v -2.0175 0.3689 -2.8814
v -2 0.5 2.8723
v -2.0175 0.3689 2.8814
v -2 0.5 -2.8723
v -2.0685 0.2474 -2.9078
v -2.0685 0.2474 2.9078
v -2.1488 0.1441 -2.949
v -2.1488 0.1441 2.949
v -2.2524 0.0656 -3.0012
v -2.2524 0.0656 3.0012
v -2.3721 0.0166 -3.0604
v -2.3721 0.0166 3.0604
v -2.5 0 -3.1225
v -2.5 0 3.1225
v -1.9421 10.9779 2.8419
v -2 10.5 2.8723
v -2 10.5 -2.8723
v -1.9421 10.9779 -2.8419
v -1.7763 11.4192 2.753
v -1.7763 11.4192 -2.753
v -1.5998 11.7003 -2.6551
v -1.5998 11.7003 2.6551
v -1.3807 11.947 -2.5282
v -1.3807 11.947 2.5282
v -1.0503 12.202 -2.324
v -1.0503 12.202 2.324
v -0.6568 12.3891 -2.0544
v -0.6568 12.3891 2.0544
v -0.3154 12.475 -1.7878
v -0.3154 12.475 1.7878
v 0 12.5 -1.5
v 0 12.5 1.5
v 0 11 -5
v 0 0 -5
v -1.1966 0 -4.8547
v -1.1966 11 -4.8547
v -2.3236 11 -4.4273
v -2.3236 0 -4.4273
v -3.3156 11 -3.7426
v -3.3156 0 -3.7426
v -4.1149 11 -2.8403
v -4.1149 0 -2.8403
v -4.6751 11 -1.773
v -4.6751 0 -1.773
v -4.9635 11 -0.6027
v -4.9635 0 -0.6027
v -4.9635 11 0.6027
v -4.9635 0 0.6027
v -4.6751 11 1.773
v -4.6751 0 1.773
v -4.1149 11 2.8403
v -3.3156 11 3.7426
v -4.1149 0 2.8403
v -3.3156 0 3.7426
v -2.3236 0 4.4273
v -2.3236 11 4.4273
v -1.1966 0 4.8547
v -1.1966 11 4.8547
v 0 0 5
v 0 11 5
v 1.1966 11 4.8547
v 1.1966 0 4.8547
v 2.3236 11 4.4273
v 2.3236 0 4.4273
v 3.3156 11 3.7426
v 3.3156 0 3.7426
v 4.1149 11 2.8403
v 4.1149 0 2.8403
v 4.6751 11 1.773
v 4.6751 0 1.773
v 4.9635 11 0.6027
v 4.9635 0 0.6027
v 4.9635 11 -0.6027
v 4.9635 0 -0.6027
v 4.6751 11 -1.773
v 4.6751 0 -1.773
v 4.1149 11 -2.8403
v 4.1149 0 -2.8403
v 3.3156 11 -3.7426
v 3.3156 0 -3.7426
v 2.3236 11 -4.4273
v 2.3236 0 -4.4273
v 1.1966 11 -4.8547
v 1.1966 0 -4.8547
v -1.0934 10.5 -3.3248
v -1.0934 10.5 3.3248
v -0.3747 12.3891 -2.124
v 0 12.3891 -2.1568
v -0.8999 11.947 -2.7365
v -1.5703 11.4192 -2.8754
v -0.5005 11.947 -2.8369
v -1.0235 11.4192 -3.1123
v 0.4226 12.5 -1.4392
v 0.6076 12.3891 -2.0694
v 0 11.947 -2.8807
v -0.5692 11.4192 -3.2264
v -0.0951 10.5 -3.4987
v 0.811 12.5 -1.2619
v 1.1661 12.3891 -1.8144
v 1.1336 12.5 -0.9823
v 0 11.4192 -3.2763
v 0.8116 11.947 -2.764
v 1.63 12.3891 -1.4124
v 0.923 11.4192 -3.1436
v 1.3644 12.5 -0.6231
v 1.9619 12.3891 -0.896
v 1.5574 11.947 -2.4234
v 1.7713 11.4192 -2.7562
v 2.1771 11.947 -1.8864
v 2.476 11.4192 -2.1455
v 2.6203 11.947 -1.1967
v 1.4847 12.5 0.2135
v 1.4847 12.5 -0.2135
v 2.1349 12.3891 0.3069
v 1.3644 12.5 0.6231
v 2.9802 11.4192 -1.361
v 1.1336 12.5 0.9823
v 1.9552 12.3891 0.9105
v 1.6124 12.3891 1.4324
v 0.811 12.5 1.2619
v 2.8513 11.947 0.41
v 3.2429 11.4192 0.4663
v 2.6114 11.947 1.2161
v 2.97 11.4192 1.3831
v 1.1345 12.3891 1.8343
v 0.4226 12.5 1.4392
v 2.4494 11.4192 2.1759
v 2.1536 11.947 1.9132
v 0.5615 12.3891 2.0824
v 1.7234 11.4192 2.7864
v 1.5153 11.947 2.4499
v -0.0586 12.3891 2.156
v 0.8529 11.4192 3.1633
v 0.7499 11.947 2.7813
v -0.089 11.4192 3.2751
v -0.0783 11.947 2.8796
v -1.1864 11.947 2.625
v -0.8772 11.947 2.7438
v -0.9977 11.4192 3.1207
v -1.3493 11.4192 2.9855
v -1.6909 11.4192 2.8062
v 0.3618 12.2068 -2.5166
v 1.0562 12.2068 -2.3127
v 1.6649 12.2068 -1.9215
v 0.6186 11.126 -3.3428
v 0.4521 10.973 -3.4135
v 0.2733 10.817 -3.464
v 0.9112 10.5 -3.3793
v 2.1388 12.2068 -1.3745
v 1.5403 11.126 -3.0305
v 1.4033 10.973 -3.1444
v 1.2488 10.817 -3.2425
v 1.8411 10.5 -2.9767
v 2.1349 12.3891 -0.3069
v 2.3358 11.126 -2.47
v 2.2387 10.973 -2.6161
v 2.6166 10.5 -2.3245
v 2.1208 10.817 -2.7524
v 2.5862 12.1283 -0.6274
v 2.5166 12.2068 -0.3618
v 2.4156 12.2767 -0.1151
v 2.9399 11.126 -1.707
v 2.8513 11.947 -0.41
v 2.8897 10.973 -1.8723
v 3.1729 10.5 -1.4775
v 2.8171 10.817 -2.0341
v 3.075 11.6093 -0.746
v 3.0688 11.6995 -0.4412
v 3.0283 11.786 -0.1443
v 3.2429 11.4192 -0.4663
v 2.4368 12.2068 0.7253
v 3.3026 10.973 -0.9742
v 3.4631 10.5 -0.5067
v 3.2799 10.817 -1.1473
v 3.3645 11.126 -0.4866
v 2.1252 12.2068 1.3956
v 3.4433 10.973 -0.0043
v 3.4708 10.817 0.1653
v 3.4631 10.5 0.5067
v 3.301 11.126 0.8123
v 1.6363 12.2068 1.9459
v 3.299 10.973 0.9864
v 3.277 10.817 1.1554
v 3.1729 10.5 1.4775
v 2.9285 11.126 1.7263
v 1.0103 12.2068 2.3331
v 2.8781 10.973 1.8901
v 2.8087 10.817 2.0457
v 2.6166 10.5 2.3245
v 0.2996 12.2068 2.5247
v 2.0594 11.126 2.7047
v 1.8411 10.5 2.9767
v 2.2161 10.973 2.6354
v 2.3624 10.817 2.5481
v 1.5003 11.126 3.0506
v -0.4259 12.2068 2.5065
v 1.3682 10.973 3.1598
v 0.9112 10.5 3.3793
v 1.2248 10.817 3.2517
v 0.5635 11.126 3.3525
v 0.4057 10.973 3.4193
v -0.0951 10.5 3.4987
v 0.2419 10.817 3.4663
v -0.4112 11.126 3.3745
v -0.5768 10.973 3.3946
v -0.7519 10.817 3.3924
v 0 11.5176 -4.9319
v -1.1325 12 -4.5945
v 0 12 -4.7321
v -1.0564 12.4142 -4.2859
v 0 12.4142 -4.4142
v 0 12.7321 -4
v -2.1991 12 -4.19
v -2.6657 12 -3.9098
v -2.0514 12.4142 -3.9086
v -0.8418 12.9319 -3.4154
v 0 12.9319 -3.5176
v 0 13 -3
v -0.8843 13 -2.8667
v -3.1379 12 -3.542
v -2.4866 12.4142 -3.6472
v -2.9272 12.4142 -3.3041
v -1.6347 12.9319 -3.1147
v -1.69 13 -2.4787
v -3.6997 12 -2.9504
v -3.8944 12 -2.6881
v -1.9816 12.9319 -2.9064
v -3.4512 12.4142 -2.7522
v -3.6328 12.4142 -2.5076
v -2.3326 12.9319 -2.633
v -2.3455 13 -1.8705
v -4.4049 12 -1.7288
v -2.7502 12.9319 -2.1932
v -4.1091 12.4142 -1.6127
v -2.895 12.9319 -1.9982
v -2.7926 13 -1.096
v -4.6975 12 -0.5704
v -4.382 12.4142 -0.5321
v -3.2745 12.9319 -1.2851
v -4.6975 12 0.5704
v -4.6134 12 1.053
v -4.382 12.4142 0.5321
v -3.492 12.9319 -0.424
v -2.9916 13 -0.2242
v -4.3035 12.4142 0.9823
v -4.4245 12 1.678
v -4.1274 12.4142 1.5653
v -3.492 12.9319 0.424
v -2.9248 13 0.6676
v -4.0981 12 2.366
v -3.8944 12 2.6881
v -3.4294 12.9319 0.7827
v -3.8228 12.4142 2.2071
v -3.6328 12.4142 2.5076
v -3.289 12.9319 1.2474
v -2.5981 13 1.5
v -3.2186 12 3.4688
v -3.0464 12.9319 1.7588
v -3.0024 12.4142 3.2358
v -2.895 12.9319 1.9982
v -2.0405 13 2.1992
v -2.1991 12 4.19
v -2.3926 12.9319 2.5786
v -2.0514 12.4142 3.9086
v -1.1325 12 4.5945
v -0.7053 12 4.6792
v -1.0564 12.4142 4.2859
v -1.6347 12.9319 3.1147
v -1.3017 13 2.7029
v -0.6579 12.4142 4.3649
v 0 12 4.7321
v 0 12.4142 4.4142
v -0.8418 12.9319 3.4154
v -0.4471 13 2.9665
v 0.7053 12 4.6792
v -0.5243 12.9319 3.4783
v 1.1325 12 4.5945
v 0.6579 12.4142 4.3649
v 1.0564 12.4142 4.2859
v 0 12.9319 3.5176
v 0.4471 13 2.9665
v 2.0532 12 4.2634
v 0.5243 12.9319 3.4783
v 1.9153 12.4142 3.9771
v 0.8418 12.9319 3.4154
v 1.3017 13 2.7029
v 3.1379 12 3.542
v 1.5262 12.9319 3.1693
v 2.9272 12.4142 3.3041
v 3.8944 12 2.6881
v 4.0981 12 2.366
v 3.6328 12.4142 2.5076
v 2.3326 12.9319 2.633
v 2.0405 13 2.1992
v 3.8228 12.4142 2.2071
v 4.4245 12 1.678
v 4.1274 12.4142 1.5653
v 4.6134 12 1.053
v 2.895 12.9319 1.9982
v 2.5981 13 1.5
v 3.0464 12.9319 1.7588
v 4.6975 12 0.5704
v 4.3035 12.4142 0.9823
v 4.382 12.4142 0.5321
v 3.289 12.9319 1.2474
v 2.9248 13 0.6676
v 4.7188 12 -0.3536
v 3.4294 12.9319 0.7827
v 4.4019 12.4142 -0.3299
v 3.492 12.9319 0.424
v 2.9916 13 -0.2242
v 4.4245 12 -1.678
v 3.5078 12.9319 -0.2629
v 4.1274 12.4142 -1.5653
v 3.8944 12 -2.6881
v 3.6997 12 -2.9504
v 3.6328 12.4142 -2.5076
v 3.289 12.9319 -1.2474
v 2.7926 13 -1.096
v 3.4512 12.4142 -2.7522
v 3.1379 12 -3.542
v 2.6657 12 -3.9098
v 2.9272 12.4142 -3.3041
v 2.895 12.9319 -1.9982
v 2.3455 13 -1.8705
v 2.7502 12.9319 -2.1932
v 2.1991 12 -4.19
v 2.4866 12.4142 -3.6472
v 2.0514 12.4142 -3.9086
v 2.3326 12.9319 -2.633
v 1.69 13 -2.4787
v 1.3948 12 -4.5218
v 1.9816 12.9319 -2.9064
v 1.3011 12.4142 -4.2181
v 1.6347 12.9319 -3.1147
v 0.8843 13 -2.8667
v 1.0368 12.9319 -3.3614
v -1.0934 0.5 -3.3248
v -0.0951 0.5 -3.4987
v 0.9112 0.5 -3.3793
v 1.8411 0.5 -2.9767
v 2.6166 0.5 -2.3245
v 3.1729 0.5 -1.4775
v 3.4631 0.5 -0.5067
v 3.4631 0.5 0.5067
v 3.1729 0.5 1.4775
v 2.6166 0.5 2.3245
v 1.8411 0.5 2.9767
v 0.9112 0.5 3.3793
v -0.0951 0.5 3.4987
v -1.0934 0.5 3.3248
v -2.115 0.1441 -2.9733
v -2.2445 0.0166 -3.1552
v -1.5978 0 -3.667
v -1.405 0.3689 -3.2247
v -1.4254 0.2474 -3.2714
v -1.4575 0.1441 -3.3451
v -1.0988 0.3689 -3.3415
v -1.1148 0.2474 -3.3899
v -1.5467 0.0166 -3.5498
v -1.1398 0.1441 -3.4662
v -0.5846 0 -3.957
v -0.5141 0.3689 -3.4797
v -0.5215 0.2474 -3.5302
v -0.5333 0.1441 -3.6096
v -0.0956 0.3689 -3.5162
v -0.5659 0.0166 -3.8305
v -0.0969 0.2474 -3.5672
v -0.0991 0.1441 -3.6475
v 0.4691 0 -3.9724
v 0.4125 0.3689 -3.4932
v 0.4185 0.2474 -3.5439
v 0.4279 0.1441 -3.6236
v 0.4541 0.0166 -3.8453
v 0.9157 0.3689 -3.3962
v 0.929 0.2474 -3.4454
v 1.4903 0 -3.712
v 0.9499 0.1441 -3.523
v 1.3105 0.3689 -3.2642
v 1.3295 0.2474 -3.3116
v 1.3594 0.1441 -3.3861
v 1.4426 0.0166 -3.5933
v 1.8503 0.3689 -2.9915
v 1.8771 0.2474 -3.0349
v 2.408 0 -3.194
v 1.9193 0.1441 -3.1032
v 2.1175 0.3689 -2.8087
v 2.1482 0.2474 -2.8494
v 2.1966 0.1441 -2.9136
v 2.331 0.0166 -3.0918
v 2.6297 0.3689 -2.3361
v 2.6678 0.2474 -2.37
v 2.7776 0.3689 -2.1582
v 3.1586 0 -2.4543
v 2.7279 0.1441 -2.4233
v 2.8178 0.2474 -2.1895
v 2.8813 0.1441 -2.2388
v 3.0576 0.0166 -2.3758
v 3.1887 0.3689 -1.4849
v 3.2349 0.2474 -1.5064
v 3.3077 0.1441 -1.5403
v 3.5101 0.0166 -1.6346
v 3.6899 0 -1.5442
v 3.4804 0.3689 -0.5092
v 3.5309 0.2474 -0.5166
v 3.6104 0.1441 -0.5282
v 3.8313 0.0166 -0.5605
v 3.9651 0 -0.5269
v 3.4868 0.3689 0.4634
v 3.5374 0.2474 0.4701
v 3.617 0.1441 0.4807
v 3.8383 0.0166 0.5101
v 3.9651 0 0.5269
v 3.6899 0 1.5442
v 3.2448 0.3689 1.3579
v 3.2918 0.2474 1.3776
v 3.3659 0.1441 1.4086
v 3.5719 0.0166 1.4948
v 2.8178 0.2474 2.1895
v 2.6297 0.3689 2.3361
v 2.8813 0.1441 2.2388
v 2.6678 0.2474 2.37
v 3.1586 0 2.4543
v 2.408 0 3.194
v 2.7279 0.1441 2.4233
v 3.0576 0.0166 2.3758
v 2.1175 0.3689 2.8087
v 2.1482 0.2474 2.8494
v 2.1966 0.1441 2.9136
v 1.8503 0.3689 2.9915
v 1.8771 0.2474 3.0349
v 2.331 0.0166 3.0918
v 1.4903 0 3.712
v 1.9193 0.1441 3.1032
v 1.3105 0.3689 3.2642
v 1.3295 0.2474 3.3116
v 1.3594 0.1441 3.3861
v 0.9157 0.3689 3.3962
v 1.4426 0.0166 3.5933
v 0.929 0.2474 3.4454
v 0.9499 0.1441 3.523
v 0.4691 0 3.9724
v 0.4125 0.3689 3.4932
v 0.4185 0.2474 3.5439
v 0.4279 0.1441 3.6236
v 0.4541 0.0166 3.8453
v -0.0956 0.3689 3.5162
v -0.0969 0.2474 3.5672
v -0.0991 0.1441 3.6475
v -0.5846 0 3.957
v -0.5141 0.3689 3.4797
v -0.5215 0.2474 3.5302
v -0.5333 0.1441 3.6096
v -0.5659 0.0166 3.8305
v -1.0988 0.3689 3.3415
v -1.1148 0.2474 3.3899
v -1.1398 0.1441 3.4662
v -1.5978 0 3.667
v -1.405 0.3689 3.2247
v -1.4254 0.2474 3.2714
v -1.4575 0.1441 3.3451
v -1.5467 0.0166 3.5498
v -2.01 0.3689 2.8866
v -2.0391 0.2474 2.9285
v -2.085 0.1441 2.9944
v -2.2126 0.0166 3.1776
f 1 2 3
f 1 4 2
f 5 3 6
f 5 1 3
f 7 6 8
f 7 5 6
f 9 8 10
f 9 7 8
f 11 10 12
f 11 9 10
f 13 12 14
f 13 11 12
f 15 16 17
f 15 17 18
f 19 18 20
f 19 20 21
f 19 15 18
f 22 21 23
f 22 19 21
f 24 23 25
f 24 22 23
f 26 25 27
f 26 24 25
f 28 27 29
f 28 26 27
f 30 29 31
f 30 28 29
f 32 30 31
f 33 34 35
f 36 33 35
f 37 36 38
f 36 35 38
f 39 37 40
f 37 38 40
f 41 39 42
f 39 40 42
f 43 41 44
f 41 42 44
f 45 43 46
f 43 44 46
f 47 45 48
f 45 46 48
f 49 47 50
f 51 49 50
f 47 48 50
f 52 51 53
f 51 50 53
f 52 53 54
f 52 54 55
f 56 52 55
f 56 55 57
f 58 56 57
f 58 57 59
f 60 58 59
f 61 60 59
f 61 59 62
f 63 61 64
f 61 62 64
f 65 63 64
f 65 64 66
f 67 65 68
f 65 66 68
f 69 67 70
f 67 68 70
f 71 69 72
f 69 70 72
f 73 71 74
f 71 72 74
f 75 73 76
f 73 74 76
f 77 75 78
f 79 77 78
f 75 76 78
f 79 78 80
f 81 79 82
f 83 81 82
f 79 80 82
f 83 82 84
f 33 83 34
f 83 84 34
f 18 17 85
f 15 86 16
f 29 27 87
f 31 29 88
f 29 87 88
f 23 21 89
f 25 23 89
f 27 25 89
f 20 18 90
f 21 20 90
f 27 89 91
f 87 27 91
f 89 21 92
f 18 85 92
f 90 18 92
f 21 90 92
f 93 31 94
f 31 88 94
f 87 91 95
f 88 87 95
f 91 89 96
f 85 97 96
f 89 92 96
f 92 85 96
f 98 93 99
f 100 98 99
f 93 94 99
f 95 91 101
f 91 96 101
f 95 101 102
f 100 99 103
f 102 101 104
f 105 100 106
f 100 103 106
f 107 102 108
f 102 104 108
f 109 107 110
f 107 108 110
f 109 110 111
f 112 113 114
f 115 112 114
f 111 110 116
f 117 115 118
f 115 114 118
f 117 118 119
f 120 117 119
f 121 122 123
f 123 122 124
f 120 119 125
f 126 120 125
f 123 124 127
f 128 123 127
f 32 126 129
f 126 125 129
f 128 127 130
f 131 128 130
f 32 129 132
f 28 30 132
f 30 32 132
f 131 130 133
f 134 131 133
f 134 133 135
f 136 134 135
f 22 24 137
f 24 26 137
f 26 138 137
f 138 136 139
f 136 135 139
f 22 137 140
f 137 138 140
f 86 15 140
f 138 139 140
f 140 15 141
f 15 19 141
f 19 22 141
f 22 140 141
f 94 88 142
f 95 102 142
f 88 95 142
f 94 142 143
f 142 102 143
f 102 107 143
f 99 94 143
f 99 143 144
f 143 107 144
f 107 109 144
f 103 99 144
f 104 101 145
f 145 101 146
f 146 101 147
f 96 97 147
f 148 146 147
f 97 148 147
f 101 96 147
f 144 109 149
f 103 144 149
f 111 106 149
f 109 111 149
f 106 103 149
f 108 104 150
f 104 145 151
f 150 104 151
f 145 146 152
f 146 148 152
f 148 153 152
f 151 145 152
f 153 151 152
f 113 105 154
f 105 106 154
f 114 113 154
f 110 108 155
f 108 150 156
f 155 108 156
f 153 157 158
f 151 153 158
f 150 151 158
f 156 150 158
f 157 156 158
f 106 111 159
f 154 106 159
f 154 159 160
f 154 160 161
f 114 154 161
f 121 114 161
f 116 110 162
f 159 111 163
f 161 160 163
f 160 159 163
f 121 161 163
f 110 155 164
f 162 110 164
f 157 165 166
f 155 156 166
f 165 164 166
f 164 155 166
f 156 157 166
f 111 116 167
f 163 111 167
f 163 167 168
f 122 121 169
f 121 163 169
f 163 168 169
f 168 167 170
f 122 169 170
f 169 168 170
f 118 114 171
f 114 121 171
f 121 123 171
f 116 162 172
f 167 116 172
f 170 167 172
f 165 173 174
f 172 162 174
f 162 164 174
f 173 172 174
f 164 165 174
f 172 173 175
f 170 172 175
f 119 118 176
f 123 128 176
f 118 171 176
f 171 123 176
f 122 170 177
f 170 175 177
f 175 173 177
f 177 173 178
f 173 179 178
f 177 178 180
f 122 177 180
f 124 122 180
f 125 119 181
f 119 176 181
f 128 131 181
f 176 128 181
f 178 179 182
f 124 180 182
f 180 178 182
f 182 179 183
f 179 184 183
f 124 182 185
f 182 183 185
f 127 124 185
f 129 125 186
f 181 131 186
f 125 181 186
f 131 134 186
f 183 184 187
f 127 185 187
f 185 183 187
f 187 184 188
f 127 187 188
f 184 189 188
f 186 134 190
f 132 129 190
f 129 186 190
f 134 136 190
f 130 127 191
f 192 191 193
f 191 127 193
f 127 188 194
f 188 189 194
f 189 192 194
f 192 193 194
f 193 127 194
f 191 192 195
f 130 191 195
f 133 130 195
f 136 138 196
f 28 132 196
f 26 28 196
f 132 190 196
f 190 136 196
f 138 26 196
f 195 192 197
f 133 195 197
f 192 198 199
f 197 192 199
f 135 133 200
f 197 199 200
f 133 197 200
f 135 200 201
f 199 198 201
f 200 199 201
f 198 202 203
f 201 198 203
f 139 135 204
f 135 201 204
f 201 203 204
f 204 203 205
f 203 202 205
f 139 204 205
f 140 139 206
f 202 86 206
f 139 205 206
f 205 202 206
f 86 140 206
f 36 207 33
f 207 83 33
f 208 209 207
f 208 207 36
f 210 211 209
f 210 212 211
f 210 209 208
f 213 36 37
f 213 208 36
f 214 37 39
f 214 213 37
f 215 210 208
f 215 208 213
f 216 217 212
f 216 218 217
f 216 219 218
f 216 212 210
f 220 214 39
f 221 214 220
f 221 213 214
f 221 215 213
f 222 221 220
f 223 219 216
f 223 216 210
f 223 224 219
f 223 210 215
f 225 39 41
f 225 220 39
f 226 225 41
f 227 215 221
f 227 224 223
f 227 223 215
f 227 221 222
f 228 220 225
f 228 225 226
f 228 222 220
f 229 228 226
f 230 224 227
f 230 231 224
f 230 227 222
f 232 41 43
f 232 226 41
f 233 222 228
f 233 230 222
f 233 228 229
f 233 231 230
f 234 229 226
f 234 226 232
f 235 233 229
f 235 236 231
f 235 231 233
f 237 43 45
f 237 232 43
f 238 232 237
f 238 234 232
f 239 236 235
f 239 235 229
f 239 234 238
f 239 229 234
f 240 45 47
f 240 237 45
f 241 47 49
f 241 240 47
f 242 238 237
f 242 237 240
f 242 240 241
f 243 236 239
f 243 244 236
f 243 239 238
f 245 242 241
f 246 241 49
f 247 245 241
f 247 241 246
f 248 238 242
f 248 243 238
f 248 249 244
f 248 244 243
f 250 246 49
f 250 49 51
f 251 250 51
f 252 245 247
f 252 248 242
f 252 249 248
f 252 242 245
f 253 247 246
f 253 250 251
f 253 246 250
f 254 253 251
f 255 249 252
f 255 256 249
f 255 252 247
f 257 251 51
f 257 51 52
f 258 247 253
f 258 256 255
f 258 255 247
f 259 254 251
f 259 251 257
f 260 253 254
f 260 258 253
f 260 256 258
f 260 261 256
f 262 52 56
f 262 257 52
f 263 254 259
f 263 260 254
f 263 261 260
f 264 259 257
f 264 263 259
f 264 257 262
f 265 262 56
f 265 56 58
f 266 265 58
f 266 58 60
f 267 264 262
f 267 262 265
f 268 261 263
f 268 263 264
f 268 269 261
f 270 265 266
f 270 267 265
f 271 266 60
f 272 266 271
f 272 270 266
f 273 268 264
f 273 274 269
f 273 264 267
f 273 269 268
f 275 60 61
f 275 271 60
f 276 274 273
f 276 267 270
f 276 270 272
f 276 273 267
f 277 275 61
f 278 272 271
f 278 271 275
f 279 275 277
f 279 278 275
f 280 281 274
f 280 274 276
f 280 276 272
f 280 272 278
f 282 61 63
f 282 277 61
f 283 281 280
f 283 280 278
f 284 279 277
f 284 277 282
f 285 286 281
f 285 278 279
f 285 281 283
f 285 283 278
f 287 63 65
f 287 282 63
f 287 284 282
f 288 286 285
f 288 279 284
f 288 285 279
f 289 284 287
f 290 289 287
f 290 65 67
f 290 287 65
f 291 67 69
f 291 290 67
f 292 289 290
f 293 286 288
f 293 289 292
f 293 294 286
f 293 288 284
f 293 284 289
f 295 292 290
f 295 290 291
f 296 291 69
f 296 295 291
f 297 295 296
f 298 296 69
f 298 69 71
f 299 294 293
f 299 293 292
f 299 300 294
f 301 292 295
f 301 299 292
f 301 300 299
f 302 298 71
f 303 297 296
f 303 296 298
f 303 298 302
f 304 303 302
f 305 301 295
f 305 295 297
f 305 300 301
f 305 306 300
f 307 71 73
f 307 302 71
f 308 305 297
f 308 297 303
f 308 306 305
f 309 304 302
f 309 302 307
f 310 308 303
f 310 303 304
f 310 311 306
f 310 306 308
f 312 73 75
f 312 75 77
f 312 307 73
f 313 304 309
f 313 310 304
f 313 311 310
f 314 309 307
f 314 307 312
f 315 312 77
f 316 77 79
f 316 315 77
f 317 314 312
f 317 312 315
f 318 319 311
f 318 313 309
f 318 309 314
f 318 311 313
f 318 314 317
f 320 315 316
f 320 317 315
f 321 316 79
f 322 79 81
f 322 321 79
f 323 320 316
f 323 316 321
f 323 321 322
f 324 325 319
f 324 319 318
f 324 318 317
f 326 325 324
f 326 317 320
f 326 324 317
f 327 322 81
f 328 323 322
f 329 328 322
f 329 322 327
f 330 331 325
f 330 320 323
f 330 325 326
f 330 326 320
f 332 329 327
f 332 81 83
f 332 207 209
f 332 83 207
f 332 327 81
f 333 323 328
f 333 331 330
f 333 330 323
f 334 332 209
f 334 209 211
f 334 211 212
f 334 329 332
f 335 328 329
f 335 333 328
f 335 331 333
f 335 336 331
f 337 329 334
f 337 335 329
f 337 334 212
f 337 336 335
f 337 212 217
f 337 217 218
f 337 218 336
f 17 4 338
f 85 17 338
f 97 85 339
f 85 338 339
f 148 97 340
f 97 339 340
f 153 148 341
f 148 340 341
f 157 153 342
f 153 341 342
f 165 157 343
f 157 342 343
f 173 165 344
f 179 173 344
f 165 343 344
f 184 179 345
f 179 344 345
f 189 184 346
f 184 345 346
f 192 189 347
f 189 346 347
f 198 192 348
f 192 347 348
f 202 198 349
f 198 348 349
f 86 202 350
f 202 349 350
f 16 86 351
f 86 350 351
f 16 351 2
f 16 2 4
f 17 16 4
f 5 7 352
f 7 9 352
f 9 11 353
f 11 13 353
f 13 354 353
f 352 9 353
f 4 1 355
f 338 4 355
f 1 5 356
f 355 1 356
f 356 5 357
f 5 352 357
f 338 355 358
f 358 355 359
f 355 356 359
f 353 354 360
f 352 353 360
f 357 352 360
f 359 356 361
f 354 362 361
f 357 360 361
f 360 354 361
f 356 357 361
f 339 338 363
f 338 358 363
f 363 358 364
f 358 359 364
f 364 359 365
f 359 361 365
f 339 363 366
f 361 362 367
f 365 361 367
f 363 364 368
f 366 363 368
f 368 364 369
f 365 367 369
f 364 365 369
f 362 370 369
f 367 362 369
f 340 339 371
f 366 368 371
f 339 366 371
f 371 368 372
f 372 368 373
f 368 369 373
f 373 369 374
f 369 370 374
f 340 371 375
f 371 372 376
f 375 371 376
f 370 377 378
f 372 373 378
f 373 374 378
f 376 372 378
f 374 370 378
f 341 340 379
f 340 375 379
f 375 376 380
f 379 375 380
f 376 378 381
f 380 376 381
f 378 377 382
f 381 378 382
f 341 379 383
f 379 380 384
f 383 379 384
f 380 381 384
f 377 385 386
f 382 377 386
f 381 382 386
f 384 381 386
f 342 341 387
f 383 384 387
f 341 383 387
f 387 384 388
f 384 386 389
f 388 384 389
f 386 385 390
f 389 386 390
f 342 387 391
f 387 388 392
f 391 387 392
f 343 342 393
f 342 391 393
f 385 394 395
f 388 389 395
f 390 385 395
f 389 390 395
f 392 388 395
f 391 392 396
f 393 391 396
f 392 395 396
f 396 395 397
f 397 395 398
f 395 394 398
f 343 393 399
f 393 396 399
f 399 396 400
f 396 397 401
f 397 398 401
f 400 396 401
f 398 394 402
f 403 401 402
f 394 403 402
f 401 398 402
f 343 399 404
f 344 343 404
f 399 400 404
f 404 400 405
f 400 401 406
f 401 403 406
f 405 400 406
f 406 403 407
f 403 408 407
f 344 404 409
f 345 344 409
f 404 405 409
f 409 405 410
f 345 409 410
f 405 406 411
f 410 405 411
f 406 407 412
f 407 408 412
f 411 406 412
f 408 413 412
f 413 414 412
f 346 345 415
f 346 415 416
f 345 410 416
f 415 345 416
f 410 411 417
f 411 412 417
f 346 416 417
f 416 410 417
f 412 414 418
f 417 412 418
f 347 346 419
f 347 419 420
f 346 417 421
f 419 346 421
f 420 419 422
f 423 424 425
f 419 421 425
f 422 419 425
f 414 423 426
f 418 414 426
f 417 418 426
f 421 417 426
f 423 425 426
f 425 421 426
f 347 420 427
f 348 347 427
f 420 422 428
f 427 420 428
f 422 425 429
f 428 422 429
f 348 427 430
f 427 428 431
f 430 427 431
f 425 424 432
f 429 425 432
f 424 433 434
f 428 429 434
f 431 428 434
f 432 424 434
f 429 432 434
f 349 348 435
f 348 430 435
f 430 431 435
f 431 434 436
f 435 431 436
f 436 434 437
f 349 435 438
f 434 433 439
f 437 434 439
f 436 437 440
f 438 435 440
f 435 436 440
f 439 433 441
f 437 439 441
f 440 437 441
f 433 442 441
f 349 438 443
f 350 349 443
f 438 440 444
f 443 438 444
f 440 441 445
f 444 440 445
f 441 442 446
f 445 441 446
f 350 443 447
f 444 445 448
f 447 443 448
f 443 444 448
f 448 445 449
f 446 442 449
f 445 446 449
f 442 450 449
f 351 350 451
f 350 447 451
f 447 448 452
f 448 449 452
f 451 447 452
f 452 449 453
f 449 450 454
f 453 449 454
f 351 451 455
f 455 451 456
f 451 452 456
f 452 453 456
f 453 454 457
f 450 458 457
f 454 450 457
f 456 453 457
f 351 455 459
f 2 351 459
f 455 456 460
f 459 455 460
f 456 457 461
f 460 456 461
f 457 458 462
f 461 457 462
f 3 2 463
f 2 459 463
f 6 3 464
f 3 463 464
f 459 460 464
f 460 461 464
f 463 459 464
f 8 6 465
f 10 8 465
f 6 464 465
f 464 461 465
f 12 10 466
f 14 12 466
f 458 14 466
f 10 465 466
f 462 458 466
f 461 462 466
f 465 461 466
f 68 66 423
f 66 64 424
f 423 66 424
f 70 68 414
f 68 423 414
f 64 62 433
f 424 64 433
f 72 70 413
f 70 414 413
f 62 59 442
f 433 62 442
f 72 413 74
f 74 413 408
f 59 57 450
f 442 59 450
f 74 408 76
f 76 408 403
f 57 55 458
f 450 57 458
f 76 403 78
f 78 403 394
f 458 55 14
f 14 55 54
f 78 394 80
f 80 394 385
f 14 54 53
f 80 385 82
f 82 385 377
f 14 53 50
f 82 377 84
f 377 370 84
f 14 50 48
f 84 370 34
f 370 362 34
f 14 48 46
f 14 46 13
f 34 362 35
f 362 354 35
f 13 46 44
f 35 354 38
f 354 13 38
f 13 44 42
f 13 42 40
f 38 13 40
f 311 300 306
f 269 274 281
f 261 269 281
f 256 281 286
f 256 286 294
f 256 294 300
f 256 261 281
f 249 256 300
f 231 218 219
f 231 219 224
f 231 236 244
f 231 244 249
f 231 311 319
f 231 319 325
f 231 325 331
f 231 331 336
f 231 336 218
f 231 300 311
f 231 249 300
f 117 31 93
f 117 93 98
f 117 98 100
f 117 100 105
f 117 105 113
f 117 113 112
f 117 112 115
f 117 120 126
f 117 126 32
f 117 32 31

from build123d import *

# Parameters (mm, degrees)
SKETCH1_R           = 5.000000000000002
BOSS_EXTRUDE1_DEPTH = 13
CUT_EXTRUDE1_DEPTH  = 12.5
FILLET4_R           = 2
FILLET5_R           = 0.5
FILLET6_R           = 2


with BuildPart() as part:
    # Sketch1 → Boss-Extrude1 (new body)
    with BuildSketch(Plane(origin=(0, 0, 0), x_dir=(1, 0, 0), z_dir=(0, 1, 0))):
        with Locations(Location((0, 0, 0), (0, 0, 90))):
            Circle(SKETCH1_R)
    extrude(amount=BOSS_EXTRUDE1_DEPTH)

    # Insert → Cut-Extrude1 (cut)
    with BuildSketch(Plane.XZ):
        with BuildLine():
            Line((-1.9999999999999991, 2.872281323269015), (-1.9999999999999991, -2.872281323269015))
            ThreePointArc((-1.9999999999999991, -2.872281323269015), (3.5, 0), (-1.9999999999999991, 2.872281323269015))
        make_face()
    extrude(amount=-CUT_EXTRUDE1_DEPTH, mode=Mode.SUBTRACT)

    # Fillet4
    # the kernel refuses this fillet: 2 mm, written as the material it adds along each edge
    with BuildSketch(Plane(origin=(-1.1e-16, 12.5, 0), x_dir=(-0.9999950652018582, 0, -0.0031415874858792743), z_dir=(-0.0031415874858792743, 0, 0.9999950652018582))) as fillet4_piece_1:
        with BuildLine():
            CenterArc((3.5000000000000004 - FILLET4_R, FILLET4_R), FILLET4_R, 270, 90)
            Line((3.5000000000000004 - FILLET4_R, 0), (3.5000000000000004, 0))
            Line((3.5000000000000004, 0), (3.5000000000000004, FILLET4_R))
        make_face()
    revolve(axis=Axis((-1.1e-16, 12.5, 0), (0, -1, 0)), revolution_arc=359.64)
    with BuildSketch(Plane(origin=(-1.9999999999999991, 12.5, 7.872281323269015), x_dir=(0, -1, 0), z_dir=(0, 0, -1))) as fillet4_piece_2_section:
        with BuildLine():
            CenterArc((FILLET4_R, -FILLET4_R), FILLET4_R, 90, 90)
            Line((0, -FILLET4_R), (0, 0))
            Line((0, 0), (FILLET4_R, 0))
        make_face()
    fillet4_piece_2 = extrude(amount=15.74456264653803, mode=Mode.PRIVATE)
    fillet4_piece_2 = fillet4_piece_2 & Plane(origin=(-1.1e-16, 12.065491957530494, 0), x_dir=(-0.5714285714285712, 0, -0.8206518066482901), z_dir=(0, -1, 0)) * Cylinder(3.5, 40, mode=Mode.PRIVATE)
    add(fillet4_piece_2)

    # Fillet5
    fillet5_edges = [part.edges().sort_by_distance(p)[0] for p in [
        (3.5, 0, -4.4e-16),
        (-1.9999999999999991, 0, 0),
    ]]
    fillet(fillet5_edges, radius=FILLET5_R)

    # Fillet6
    fillet6_edges = [part.edges().sort_by_distance(p)[0] for p in [
        (-9.2e-16, 13, 5.000000000000002),
    ]]
    fillet(fillet6_edges, radius=FILLET6_R)


solid = part.part
